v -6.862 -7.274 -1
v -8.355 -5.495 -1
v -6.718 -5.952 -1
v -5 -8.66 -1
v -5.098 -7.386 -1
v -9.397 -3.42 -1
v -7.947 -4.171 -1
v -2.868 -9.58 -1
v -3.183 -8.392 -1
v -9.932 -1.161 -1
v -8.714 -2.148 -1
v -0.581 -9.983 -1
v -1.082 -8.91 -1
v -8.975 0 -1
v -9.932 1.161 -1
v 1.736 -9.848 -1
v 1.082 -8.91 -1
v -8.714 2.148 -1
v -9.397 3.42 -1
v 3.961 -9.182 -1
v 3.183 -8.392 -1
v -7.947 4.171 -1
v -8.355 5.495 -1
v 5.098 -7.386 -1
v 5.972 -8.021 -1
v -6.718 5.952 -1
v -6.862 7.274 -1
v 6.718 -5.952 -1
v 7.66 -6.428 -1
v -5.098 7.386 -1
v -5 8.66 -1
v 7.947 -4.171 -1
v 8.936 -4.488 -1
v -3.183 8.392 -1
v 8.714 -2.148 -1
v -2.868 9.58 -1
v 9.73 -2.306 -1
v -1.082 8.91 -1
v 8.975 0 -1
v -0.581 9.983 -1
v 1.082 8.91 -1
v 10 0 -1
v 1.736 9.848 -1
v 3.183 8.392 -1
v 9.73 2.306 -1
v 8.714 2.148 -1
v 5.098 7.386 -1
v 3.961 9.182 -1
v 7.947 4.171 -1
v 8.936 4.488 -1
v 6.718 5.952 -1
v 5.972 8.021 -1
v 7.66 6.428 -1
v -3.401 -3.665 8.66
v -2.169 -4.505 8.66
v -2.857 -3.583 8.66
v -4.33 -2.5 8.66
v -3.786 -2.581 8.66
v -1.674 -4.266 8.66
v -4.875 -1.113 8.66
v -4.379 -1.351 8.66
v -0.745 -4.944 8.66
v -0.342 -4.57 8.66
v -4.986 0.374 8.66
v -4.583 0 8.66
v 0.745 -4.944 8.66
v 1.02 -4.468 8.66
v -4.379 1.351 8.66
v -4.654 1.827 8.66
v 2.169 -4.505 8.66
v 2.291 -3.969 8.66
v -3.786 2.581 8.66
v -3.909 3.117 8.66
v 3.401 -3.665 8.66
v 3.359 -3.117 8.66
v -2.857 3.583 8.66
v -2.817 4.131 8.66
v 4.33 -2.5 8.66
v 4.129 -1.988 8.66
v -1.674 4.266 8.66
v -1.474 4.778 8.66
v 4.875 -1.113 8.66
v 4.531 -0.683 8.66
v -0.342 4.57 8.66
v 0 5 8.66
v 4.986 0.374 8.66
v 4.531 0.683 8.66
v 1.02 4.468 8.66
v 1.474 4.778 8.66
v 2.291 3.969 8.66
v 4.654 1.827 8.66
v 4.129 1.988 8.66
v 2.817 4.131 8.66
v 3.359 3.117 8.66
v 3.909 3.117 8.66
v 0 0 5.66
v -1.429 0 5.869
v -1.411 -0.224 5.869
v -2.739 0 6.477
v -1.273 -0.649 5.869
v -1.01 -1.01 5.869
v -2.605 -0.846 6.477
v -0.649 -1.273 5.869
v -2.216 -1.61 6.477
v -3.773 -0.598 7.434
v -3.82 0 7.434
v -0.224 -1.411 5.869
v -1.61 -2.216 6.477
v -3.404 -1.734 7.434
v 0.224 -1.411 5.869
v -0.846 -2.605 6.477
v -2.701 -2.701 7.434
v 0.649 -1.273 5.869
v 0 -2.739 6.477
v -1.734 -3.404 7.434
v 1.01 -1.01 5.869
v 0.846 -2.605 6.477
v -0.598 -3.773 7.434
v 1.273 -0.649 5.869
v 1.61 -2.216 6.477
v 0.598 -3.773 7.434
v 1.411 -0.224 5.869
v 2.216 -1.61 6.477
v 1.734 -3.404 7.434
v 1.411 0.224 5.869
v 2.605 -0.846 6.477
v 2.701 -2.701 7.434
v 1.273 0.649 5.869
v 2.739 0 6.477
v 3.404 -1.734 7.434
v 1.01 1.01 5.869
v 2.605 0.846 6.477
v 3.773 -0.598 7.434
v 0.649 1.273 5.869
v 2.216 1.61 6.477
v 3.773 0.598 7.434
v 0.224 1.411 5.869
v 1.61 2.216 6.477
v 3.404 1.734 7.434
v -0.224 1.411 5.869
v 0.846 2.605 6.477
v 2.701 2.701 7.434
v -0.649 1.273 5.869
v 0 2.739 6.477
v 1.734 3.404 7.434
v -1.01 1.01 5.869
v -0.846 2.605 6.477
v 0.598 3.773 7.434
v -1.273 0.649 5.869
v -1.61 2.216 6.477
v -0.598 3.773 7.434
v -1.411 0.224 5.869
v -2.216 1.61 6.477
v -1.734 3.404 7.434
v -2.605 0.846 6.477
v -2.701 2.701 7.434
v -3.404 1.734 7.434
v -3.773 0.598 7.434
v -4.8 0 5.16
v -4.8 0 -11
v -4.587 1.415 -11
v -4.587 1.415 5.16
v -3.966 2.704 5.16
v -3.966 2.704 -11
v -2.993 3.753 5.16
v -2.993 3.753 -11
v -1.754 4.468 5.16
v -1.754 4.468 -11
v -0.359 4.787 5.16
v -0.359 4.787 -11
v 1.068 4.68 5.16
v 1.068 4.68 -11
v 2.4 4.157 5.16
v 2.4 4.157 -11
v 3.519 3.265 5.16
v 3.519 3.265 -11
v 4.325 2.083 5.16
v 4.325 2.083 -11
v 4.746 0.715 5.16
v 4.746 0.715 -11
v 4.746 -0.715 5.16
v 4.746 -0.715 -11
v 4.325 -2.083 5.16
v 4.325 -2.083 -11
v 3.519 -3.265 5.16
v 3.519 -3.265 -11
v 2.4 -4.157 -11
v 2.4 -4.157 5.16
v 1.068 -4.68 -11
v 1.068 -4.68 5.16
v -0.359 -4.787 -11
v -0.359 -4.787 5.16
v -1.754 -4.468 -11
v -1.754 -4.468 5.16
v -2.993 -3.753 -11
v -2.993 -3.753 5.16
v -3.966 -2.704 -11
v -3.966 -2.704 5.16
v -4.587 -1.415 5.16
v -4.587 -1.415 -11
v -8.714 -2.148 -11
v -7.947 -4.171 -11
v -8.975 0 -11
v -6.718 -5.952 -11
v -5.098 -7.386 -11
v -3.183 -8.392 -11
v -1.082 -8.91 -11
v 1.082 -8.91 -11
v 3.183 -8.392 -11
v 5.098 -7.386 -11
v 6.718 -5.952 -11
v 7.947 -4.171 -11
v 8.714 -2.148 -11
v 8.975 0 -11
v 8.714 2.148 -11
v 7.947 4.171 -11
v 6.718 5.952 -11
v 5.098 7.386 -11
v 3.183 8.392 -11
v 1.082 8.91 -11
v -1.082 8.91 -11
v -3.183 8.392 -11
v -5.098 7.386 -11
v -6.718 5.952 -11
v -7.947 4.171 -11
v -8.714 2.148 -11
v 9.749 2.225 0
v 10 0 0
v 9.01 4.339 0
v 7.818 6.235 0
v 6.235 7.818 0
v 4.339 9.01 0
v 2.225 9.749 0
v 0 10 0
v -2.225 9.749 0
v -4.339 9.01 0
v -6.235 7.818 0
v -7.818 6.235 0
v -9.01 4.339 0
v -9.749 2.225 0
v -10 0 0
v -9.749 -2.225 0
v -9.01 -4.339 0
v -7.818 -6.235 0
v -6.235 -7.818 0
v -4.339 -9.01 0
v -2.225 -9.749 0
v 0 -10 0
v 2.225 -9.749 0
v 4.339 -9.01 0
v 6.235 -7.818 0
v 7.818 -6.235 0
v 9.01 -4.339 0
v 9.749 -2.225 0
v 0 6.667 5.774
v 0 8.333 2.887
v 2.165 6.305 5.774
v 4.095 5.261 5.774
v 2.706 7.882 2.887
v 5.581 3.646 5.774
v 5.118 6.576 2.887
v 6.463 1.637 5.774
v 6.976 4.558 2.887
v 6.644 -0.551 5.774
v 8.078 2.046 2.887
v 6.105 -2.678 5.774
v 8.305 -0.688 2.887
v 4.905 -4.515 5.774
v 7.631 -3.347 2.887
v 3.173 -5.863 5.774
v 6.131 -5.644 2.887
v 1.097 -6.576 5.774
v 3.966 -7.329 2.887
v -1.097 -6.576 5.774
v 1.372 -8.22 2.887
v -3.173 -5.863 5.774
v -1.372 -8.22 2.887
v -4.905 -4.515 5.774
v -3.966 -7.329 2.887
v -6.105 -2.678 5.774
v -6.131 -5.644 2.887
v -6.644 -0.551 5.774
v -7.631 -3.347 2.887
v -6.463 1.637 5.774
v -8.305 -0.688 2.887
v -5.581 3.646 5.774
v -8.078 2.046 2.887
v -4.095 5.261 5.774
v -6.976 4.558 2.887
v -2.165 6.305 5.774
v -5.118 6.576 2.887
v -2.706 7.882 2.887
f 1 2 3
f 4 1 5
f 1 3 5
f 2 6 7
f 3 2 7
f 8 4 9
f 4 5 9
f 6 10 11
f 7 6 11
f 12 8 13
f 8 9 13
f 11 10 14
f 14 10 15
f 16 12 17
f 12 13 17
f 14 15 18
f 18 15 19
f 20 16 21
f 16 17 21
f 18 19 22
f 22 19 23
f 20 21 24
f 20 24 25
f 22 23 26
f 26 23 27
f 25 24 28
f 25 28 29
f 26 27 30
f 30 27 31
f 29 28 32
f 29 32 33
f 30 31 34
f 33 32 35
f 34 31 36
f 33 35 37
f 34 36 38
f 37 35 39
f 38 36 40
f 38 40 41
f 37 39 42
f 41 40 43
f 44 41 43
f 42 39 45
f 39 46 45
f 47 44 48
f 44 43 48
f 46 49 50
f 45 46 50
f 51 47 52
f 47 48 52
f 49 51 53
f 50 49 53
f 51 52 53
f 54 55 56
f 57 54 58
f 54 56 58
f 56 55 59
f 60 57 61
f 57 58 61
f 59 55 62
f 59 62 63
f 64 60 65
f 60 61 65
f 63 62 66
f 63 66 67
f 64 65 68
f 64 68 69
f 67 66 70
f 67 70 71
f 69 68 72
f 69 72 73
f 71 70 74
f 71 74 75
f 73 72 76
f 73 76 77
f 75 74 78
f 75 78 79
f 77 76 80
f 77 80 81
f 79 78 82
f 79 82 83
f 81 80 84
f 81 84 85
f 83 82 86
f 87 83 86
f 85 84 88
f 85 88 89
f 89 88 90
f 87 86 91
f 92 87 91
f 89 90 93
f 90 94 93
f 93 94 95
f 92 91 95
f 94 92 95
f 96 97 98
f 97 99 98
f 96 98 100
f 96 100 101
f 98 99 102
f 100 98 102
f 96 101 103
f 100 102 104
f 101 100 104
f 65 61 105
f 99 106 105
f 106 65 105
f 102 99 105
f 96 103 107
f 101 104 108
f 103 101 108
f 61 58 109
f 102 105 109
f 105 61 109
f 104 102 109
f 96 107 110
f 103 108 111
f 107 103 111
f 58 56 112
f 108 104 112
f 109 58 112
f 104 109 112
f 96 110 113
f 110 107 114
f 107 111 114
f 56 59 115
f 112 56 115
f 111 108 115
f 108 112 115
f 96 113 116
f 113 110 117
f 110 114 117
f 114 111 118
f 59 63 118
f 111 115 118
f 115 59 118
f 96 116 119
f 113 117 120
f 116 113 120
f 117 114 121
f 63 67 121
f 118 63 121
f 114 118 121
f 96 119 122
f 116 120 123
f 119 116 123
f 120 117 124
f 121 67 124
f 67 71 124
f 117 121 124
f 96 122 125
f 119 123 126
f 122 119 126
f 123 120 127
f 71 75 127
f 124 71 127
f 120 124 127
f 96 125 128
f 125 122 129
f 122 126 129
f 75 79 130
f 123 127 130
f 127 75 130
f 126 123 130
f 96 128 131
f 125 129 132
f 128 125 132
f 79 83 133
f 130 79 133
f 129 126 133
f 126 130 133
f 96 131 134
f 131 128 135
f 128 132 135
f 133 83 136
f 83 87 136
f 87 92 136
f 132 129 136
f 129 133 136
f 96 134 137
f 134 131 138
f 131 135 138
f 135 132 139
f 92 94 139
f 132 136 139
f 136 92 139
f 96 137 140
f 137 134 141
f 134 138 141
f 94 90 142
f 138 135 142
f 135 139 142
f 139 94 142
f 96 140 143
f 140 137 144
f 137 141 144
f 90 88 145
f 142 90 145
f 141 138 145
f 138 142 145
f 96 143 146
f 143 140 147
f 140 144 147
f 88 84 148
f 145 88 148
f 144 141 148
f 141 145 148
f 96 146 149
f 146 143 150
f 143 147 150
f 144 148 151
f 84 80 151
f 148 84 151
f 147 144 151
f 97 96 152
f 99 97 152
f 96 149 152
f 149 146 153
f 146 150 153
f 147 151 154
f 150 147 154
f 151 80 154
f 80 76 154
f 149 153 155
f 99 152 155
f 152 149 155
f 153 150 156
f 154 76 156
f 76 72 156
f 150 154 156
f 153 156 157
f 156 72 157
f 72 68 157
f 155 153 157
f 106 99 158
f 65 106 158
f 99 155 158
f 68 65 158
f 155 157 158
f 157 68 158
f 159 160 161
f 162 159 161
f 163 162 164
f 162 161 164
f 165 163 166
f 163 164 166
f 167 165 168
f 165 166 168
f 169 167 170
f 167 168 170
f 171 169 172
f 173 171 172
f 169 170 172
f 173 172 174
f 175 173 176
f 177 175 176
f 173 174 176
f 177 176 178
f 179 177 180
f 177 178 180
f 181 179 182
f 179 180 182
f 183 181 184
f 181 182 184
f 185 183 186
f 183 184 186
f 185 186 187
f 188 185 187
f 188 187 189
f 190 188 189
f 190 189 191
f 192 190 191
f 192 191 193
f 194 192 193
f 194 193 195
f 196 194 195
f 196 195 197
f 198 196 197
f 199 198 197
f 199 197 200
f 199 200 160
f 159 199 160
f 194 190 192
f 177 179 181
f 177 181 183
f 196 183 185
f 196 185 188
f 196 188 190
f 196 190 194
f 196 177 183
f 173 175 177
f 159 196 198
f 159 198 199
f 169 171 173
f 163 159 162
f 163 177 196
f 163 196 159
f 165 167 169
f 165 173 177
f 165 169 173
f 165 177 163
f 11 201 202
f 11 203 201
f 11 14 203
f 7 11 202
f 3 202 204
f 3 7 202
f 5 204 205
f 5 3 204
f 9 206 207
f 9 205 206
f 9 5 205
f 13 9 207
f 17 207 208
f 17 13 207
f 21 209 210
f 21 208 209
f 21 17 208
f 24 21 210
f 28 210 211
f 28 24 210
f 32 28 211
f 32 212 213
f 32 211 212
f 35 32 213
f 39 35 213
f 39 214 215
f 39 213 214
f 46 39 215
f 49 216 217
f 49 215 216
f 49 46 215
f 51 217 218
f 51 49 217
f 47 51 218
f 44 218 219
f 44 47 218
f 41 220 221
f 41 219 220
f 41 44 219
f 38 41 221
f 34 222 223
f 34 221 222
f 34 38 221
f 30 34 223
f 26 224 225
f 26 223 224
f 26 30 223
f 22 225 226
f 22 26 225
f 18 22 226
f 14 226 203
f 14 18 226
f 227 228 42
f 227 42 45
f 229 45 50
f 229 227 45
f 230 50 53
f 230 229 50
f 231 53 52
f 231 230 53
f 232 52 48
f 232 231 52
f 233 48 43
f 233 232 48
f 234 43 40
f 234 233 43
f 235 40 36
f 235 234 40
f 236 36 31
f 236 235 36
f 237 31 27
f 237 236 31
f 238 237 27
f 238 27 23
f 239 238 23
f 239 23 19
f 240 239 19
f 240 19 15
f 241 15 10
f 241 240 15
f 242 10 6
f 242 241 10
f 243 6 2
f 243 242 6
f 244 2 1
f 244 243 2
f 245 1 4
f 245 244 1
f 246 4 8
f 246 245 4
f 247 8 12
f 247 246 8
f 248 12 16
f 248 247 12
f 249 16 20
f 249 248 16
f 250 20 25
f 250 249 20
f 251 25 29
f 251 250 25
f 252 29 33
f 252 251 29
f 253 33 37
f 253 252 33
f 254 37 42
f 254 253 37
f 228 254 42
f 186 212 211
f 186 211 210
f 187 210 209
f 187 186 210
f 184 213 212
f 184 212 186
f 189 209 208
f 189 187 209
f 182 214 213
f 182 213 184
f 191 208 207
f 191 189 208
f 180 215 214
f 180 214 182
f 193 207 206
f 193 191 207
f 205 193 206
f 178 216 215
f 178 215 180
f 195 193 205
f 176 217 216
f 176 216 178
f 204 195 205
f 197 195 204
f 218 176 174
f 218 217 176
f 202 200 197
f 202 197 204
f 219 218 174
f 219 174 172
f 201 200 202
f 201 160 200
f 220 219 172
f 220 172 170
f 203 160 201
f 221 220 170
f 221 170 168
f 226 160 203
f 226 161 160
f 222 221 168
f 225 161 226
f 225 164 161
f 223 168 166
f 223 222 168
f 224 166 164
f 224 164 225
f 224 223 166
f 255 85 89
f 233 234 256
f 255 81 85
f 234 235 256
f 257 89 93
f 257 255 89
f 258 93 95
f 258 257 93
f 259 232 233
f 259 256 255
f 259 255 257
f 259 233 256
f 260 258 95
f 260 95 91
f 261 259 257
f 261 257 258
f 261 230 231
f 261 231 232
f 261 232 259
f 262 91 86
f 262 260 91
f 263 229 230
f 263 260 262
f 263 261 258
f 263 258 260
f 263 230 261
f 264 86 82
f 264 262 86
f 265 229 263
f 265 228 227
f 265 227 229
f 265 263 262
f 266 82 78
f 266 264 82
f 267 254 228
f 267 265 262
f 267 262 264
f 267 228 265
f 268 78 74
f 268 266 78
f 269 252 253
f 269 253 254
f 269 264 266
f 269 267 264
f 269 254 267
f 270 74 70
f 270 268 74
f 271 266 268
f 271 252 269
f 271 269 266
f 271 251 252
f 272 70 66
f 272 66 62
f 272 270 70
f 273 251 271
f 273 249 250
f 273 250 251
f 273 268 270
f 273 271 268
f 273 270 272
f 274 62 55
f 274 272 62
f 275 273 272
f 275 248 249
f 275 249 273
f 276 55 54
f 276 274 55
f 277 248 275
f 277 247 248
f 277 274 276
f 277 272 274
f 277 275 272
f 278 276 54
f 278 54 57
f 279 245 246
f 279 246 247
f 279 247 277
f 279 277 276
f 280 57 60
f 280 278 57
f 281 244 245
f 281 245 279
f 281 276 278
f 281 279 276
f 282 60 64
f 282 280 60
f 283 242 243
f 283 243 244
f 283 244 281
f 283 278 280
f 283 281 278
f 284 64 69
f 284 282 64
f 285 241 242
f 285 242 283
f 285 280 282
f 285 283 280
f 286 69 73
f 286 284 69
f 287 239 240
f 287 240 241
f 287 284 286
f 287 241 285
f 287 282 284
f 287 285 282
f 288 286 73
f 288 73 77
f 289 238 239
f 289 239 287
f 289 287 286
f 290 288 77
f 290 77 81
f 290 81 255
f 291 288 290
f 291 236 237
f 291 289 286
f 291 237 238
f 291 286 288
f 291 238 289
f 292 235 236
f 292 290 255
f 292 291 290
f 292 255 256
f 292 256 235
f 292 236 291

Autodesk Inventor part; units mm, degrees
ref_plane "YZ Plane" through (0, 0, 0) normal (1, 0, 0) x (0, 1, 0)
ref_plane "XZ Plane" through (0, 0, 0) normal (0, 1, 0) x (-1, 0, 0)
ref_plane "XY Plane" through (0, 0, 0) normal (0, 0, 1) x (1, 0, 0)
sketch "RingSketch" plane through (0, 0, 0) normal (0, 0, 1) x (1, 0, 0)
  circle A0 centre (0, 0) radius 10
  dimension "RingDia" = 20
extrude "Ring" add sketch "RingSketch" against normal blind 1
sketch "ShankSketch" plane through (0, 0, -1) normal (0, 0, -1) x (-1, 0, 0)
  circle A0 centre (0, 0) radius 8.975
  dimension "ShankDia" = 17.95
extrude "Shank" add sketch "ShankSketch" along normal blind 10
sketch "ConeSketch" plane through (0, 0, 0) normal (1, 0, 0) x (0, 1, 0)
  line L0 (0, 0) -> (10, 0)
  line L1 (10, 0) -> (5, 8.6603)
  line L2 (5, 8.6603) -> (0, 8.6603)
  line L3 (0, 8.6603) -> (0, 0)
  line L4 (-10, 0) -> (10, 0) projected
  dimension "ConeAngle" = 60
  dimension "ConeBase" = 10
  dimension "ConeTipDia" = 5
revolve "Cone" add sketch "ConeSketch" angle 360 about axis through (0, 0, 8.6603) along (0, 0, -1)
sketch "SocketSketch" plane through (0, 0, 0) normal (0, 1, 0) x (-1, 0, 0)
  arc A0 (0, 5.6603) -> (0, 15.6603) centre (0, 10.6603) ccw
  line L0 (0, 15.6603) -> (0, 5.6603)
  line L1 (-5, 8.6603) -> (5, 8.6603) projected
  line L2 (5, 8.6603) -> (10, 0) projected
  point P0 (0, 0)
  dimension "RecessDia" = 10
  dimension "BallOffset" = 2
revolve "Socket" cut sketch "SocketSketch" angle 360 about axis through (0, 0, 15.6603) along (0, 0, -1)
sketch "MagnetHoleSketch" plane through (0, 0, -11) normal (0, 0, -1) x (-1, 0, 0)
  circle A0 centre (0, 0) radius 4.8
  dimension "MagnetHoleDia" = 9.6
extrude "MagnetHole" cut sketch "MagnetHoleSketch" against normal blind 16.1603
sketch "PartLength" plane through (0, 0, 0) normal (0, 1, 0) x (-1, 0, 0)
  line L0 (-5, 8.6603) -> (5, 8.6603) projected
  line L1 (-8.975, -11) -> (8.975, -11) projected
  point P0 (0, 0)
  dimension "PartLen" = 19.6603
equation "\"ConeBase\" = 0.5 * RingDia"
equation "\"ConeTipDia\" = 0.5 * BallDia"
equation "\"RecessDia\" = BallDia"
equation "\"BallDia\" = 10"
properties part number "Rod End 20mm Formula-driven"
